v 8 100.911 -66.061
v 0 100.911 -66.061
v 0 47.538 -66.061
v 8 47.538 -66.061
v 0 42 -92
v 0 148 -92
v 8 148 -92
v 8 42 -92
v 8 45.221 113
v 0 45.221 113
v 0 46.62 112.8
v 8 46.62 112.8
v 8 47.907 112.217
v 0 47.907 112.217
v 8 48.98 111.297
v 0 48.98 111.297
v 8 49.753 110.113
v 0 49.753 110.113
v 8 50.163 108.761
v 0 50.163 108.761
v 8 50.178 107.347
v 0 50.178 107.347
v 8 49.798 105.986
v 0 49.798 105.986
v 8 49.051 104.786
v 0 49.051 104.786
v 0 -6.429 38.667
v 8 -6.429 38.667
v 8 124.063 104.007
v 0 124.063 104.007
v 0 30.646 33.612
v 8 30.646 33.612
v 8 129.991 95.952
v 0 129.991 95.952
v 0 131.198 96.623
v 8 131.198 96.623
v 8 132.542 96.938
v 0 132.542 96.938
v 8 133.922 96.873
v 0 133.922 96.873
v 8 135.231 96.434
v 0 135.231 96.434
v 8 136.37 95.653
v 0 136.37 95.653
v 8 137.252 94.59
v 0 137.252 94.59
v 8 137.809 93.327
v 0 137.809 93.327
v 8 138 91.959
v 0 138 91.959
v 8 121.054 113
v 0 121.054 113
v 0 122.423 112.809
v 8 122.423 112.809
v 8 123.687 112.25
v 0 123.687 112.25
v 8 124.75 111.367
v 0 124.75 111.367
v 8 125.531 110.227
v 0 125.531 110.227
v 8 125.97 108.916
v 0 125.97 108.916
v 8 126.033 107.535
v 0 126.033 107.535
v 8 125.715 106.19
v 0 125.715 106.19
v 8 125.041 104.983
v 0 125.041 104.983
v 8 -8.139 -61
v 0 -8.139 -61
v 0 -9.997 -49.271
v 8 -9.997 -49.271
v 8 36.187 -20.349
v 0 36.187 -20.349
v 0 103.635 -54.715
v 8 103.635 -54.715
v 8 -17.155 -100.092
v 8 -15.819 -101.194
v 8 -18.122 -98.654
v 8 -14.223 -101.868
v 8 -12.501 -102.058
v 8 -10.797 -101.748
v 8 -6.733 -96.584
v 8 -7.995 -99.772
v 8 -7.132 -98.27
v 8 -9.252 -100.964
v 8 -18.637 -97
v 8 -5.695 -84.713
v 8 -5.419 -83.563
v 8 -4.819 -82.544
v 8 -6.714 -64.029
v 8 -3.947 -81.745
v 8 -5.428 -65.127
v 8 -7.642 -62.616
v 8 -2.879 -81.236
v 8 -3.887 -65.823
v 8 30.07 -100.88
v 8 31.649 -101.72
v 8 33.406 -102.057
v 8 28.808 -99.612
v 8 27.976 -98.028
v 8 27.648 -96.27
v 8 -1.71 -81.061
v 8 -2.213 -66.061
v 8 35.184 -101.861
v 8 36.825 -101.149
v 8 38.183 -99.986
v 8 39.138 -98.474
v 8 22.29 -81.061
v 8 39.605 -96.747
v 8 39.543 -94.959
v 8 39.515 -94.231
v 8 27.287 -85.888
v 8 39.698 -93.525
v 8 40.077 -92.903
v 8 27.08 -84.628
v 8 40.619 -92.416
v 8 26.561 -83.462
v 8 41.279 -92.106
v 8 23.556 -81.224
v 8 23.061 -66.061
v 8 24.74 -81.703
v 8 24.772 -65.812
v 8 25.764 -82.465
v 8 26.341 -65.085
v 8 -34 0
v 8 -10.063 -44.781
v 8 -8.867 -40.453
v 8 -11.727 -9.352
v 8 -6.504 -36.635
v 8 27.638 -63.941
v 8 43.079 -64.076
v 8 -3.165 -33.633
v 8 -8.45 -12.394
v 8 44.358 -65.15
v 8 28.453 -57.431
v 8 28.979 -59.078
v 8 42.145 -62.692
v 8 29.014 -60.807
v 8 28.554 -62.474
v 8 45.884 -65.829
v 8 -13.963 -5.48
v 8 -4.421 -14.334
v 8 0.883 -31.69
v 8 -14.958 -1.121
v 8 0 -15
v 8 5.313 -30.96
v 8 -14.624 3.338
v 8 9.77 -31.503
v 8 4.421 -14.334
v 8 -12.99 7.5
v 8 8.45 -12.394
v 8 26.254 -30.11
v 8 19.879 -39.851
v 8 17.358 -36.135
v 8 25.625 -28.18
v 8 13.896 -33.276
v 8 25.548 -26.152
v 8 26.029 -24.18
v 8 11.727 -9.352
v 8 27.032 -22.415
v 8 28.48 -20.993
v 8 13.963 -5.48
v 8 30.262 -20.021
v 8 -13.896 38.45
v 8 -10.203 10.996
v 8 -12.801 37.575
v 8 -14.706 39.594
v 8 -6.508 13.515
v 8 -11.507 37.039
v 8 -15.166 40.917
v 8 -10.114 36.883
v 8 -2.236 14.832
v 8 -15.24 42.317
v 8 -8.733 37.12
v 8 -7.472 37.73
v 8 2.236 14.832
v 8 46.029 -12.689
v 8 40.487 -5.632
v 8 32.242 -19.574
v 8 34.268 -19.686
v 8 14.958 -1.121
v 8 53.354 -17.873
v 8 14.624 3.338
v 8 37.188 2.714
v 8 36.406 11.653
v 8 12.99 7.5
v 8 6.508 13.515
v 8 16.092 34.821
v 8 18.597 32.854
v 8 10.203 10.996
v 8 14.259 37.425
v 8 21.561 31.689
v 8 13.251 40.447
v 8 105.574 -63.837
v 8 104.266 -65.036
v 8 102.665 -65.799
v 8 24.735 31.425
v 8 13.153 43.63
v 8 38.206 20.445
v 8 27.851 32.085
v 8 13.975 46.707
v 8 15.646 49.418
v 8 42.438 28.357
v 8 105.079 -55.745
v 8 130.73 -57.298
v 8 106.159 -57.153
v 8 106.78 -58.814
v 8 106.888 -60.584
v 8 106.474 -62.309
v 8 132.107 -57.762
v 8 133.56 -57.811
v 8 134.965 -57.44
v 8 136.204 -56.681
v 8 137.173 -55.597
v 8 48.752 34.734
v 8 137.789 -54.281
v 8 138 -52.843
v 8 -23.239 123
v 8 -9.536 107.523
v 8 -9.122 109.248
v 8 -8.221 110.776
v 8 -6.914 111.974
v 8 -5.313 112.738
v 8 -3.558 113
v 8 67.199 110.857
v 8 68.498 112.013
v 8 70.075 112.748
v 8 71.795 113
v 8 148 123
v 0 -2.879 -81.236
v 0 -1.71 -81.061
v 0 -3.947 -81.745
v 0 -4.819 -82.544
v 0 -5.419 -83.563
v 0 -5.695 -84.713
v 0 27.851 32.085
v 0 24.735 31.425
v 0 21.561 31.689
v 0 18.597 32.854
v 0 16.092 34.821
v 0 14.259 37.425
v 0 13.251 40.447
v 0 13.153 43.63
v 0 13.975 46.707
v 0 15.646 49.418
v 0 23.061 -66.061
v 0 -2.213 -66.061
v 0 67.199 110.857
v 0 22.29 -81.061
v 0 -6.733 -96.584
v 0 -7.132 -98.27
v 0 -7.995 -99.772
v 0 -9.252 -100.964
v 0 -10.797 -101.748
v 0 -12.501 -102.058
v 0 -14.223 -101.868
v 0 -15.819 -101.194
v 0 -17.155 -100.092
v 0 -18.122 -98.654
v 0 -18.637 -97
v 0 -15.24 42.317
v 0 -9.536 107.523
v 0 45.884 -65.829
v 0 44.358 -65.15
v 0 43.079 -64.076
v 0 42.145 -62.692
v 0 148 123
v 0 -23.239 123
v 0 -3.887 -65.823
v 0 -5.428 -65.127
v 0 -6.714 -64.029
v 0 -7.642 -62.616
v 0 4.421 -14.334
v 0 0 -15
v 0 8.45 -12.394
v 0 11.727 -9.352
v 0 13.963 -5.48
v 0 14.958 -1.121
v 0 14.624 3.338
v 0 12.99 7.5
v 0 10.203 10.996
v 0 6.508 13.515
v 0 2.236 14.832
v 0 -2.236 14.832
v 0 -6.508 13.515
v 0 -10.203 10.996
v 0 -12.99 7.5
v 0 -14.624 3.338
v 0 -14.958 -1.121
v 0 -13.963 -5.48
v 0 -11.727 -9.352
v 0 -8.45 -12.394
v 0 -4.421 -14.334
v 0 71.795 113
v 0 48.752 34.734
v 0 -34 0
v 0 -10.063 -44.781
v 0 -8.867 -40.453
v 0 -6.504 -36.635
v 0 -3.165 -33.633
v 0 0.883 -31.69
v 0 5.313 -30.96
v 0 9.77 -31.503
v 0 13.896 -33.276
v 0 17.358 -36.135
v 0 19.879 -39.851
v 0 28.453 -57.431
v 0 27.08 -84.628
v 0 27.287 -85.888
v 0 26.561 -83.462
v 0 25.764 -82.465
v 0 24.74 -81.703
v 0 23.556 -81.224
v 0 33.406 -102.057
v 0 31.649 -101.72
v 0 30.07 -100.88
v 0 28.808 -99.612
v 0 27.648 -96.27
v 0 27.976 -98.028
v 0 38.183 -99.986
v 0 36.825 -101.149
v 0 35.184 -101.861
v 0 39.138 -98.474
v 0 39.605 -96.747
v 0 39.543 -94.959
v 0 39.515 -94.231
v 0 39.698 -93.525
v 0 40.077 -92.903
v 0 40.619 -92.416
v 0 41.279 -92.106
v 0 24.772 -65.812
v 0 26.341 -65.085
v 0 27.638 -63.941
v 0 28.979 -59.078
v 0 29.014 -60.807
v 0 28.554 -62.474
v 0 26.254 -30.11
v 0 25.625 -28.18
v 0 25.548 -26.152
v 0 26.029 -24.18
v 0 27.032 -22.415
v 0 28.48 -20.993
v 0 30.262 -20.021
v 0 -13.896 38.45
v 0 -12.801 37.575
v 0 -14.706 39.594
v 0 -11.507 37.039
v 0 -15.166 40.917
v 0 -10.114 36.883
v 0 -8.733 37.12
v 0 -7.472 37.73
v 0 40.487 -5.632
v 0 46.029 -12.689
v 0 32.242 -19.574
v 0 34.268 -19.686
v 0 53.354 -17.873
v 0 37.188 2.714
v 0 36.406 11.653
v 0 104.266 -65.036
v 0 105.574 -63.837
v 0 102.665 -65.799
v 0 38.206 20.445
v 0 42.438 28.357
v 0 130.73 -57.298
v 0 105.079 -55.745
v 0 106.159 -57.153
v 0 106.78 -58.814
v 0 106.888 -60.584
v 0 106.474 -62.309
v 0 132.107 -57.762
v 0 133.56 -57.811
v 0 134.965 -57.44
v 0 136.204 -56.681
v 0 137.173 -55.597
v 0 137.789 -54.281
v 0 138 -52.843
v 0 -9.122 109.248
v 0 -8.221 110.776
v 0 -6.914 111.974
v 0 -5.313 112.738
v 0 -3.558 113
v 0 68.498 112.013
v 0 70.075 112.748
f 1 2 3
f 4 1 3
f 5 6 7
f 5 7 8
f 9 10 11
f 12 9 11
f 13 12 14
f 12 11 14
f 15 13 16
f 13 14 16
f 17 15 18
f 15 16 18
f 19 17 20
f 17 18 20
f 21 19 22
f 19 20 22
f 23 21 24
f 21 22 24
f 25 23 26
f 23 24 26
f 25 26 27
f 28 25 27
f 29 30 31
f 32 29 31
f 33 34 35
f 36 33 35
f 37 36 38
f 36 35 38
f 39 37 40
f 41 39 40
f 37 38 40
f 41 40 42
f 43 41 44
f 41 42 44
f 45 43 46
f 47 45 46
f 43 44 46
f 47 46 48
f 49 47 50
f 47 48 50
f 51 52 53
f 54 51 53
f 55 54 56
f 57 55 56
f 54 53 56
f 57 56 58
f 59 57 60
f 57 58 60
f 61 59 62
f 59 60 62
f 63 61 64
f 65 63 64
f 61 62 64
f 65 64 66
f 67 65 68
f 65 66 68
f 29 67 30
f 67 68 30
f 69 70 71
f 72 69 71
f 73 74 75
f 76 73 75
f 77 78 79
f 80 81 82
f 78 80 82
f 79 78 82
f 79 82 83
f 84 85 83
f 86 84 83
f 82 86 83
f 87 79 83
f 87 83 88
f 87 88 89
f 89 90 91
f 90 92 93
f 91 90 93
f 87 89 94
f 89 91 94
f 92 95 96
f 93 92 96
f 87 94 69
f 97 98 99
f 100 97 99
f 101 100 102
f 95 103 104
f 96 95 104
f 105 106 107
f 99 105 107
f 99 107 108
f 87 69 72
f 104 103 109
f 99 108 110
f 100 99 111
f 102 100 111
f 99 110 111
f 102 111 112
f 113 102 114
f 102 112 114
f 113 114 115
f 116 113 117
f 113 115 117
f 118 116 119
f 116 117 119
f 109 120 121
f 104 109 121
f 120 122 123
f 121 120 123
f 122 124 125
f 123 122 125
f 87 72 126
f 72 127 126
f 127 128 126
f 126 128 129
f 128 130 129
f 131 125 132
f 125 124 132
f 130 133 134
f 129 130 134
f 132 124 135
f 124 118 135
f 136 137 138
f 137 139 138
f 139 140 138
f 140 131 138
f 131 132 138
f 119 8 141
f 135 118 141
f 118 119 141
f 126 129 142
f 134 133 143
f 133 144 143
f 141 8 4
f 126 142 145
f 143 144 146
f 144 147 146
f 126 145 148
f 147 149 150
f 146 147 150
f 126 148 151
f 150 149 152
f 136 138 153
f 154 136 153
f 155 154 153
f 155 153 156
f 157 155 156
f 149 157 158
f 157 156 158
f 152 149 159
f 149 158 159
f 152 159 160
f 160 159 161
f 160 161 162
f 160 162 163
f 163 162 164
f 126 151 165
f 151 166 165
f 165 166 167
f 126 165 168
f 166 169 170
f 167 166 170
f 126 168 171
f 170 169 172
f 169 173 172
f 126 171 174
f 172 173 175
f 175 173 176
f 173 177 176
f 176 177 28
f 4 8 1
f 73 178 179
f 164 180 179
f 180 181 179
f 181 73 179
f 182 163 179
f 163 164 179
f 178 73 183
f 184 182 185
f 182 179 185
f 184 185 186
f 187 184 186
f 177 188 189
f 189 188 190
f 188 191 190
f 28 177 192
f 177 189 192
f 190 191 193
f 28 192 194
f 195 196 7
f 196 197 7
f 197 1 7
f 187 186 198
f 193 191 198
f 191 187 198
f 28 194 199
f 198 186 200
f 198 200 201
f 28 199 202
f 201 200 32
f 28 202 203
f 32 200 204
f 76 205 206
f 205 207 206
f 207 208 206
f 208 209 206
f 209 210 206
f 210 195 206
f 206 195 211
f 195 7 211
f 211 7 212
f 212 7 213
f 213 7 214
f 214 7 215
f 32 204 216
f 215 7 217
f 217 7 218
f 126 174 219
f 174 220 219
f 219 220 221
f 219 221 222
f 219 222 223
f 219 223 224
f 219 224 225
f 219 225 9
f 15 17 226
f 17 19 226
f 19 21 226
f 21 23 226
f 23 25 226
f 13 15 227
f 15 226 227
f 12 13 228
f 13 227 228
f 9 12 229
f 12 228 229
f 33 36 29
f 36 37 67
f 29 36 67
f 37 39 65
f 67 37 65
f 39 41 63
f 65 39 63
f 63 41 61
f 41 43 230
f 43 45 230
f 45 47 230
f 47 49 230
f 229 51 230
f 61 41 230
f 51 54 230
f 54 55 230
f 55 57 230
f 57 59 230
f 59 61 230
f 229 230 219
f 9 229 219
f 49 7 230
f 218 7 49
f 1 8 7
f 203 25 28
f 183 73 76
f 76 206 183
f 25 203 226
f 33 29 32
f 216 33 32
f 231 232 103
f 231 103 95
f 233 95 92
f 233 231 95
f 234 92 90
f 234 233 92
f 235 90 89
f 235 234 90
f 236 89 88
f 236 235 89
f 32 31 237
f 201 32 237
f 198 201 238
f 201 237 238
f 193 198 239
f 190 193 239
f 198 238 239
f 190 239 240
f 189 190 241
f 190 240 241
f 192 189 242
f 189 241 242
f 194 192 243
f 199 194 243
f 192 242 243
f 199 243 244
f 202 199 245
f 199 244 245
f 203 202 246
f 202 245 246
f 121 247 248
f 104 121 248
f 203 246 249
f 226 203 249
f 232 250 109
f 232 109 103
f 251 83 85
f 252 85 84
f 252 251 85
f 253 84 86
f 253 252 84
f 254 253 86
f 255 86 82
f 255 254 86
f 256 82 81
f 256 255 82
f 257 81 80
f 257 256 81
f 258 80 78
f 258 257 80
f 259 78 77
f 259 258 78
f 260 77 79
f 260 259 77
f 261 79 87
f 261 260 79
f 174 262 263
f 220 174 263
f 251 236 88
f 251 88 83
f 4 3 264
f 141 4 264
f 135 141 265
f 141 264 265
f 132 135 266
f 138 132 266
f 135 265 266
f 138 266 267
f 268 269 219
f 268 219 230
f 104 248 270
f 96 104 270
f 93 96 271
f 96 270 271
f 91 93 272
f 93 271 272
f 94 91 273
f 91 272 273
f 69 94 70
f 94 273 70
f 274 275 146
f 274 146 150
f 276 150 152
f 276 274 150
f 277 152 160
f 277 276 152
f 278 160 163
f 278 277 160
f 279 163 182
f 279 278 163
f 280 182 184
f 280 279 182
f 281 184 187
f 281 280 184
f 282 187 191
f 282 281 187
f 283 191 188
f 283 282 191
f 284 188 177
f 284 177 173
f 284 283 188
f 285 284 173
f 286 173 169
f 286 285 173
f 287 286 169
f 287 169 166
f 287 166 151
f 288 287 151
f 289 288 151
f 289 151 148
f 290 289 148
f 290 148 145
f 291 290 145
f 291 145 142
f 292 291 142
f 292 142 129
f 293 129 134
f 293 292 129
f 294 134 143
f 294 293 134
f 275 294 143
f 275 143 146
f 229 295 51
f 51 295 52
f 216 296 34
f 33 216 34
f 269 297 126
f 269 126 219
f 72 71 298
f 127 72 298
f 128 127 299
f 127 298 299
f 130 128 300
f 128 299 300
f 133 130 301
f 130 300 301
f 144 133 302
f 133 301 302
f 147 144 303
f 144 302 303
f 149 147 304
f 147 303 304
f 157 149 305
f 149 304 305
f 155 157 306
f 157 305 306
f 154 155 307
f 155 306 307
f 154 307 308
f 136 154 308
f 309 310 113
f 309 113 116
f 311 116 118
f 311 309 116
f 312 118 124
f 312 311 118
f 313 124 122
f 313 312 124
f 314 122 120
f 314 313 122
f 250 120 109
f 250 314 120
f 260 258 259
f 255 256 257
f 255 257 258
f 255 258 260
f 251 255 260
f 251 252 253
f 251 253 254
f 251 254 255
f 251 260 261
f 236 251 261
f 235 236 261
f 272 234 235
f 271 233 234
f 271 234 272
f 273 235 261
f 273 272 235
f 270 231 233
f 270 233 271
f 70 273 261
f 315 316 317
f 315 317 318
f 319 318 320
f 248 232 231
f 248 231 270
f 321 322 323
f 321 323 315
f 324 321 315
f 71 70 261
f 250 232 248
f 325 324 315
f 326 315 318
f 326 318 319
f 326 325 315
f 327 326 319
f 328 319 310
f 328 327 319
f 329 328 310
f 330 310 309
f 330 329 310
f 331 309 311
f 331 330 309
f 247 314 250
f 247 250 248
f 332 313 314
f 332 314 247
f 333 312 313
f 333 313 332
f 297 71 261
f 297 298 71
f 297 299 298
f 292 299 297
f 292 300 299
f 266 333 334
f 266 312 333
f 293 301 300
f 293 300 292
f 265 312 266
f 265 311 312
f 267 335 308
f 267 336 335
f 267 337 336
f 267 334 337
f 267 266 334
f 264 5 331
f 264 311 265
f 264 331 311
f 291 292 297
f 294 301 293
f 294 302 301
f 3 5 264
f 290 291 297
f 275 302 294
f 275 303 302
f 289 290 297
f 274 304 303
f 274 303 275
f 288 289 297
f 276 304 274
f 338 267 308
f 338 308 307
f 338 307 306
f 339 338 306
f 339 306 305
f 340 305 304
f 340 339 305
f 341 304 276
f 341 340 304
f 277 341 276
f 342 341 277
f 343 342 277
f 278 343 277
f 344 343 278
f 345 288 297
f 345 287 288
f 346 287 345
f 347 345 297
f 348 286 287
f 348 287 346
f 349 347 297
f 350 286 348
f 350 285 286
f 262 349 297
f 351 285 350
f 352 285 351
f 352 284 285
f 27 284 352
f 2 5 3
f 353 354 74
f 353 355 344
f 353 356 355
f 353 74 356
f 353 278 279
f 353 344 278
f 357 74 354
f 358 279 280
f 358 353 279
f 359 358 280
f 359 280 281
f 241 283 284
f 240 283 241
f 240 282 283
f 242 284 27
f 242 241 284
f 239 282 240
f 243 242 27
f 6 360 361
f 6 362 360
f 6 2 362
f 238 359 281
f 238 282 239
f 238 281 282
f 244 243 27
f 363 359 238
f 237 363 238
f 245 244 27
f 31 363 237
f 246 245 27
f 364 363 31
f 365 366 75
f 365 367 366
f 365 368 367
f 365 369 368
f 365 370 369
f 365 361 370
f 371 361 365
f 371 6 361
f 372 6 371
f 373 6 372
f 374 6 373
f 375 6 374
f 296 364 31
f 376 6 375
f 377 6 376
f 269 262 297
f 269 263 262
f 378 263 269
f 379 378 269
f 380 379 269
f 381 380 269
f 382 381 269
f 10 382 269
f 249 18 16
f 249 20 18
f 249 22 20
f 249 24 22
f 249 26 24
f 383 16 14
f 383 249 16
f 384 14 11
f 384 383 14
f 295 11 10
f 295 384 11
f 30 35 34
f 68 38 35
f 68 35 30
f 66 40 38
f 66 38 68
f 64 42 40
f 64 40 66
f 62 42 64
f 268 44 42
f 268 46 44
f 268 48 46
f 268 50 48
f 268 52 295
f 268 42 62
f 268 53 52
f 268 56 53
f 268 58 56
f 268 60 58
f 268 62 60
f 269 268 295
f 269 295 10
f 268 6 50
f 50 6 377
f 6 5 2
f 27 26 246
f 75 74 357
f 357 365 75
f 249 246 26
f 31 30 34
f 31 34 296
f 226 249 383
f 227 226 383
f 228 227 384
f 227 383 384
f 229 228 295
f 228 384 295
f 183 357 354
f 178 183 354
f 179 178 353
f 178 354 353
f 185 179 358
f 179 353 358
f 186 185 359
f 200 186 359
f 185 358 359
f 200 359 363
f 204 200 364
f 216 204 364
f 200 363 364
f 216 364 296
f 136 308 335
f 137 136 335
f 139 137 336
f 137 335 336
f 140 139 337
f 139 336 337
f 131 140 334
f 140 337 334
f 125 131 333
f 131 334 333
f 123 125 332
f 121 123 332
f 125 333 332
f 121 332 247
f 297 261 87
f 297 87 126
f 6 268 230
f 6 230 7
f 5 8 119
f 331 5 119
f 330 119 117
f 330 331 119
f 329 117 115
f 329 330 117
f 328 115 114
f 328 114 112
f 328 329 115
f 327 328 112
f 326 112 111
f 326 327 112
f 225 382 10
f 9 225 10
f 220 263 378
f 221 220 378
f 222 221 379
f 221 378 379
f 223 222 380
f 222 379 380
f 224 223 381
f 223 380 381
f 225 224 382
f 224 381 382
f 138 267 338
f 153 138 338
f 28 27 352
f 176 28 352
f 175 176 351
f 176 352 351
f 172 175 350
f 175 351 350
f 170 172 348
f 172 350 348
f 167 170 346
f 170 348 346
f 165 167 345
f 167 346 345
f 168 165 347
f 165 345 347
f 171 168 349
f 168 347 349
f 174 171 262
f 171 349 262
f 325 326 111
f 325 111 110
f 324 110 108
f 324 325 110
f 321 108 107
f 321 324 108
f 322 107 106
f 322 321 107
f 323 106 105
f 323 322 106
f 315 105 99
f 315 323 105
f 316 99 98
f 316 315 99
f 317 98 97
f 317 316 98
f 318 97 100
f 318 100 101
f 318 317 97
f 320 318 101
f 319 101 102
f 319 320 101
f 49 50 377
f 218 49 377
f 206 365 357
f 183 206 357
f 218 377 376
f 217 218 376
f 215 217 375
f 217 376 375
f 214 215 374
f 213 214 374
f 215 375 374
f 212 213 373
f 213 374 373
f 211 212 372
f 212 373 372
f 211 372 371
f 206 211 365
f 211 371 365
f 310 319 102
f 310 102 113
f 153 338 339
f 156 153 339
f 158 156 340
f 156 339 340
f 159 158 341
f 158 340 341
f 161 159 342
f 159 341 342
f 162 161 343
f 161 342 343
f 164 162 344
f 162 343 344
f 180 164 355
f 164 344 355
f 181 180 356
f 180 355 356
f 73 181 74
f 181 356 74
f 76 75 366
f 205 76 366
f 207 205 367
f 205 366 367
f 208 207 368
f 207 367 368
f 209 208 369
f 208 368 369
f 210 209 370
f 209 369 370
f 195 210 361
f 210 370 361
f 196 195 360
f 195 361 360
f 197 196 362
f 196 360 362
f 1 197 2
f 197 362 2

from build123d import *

# Parameters (mm, degrees)
SKETCH2_R   = 15
FRAME_DEPTH = 8


with BuildPart() as part:
    # Sketch2 → frame (new body)
    with BuildSketch(Plane(origin=(0, 0, 0), x_dir=(0, 0, -1), z_dir=(1, 0, 0))):
        with BuildLine():
            Line((0, -34), (-123, -23.238894386))
            Line((-123, -23.238894386), (-123, 148))
            Line((-123, 148), (92, 148))
            Line((92, 148), (92, 42))
            ThreePointArc((92, 42), (92.902828006, 40.076710729), (94.959233297, 39.542540991))
            ThreePointArc((94.959233297, 39.542540991), (102.025285395, 34.301898835), (96.270058953, 27.648268918))
            Line((96.270058953, 27.648268918), (85.887505091, 27.286969807))
            ThreePointArc((85.887505091, 27.286969807), (82.464905993, 25.763505578), (81.06139321, 22.289994429))
            Line((81.06139321, 22.289994429), (81.06139321, -1.710005571))
            ThreePointArc((81.06139321, -1.710005571), (82.112283863, -4.412366401), (84.712770239, -5.694784363))
            Line((84.712770239, -5.694784363), (96.584327666, -6.733411056))
            ThreePointArc((96.584327666, -6.733411056), (102.057738172, -12.501182265), (97, -18.636709289))
            Line((97, -18.636709289), (0, -34))
        make_face()
        Circle(SKETCH2_R, mode=Mode.SUBTRACT)
        with BuildLine():
            Line((-113, -3.558496414), (-113, 45.220981939))
            ThreePointArc((-113, 45.220981939), (-110.113091309, 49.752520874), (-104.786061952, 49.051204155))
            Line((-104.786061952, 49.051204155), (-38.667003468, -6.429273433))
            ThreePointArc((-38.667003468, -6.429273433), (-37.261543853, -12.172912811), (-42.31672023, -15.240469139))
            Line((-42.31672023, -15.240469139), (-107.522934456, -9.535664603))
            ThreePointArc((-107.522934456, -9.535664603), (-111.423664021, -7.61203766), (-113, -3.558496414))
        make_face(mode=Mode.SUBTRACT)
        with BuildLine():
            Line((-113, 71.795435384), (-113, 121.054164621))
            ThreePointArc((-113, 121.054164621), (-109.586523282, 125.795782897), (-104.00682245, 124.063239737))
            Line((-104.00682245, 124.063239737), (-33.611864664, 30.645975539))
            ThreePointArc((-33.611864664, 30.645975539), (-34.821190136, 16.092200216), (-49.418311221, 15.646217831))
            Line((-49.418311221, 15.646217831), (-110.856725658, 67.199168725))
            ThreePointArc((-110.856725658, 67.199168725), (-112.437846722, 69.259725813), (-113, 71.795435384))
        make_face(mode=Mode.SUBTRACT)
        with BuildLine():
            Line((-91.959119468, 138), (52.842661319, 138))
            ThreePointArc((52.842661319, 138), (57.105862141, 135.612492824), (57.29769394, 130.730047501))
            Line((57.29769394, 130.730047501), (17.87282228, 53.354380202))
            ThreePointArc((17.87282228, 53.354380202), (-7.155112396, 36.472825104), (-34.734267785, 48.7518562))
            Line((-34.734267785, 48.7518562), (-95.952297019, 129.990924884))
            ThreePointArc((-95.952297019, 129.990924884), (-96.433791276, 135.230989066), (-91.959119468, 138))
        make_face(mode=Mode.SUBTRACT)
        with BuildLine():
            Line((66.06139321, 100.911084489), (66.06139321, 47.537774319))
            ThreePointArc((66.06139321, 47.537774319), (65.149681787, 44.358258734), (62.69162009, 42.145010042))
            Line((62.69162009, 42.145010042), (30.109631358, 26.253712336))
            ThreePointArc((30.109631358, 26.253712336), (21.653823385, 27.706685885), (20.348645329, 36.186563882))
            Line((20.348645329, 36.186563882), (54.715354065, 103.635027487))
            ThreePointArc((54.715354065, 103.635027487), (61.462065393, 106.745304011), (66.06139321, 100.911084489))
        make_face(mode=Mode.SUBTRACT)
        with BuildLine():
            Line((66.06139321, 23.060531629), (66.06139321, -2.212977084))
            ThreePointArc((66.06139321, -2.212977084), (64.623829003, -6.109665374), (61, -8.139107128))
            Line((61, -8.139107128), (49.27069142, -9.996847102))
            ThreePointArc((49.27069142, -9.996847102), (31.689538707, 0.882700312), (39.850923857, 19.878838738))
            Line((39.850923857, 19.878838738), (57.431166329, 28.453295907))
            ThreePointArc((57.431166329, 28.453295907), (63.240908795, 28.148820206), (66.06139321, 23.060531629))
        make_face(mode=Mode.SUBTRACT)
    extrude(amount=FRAME_DEPTH)


solid = part.part
